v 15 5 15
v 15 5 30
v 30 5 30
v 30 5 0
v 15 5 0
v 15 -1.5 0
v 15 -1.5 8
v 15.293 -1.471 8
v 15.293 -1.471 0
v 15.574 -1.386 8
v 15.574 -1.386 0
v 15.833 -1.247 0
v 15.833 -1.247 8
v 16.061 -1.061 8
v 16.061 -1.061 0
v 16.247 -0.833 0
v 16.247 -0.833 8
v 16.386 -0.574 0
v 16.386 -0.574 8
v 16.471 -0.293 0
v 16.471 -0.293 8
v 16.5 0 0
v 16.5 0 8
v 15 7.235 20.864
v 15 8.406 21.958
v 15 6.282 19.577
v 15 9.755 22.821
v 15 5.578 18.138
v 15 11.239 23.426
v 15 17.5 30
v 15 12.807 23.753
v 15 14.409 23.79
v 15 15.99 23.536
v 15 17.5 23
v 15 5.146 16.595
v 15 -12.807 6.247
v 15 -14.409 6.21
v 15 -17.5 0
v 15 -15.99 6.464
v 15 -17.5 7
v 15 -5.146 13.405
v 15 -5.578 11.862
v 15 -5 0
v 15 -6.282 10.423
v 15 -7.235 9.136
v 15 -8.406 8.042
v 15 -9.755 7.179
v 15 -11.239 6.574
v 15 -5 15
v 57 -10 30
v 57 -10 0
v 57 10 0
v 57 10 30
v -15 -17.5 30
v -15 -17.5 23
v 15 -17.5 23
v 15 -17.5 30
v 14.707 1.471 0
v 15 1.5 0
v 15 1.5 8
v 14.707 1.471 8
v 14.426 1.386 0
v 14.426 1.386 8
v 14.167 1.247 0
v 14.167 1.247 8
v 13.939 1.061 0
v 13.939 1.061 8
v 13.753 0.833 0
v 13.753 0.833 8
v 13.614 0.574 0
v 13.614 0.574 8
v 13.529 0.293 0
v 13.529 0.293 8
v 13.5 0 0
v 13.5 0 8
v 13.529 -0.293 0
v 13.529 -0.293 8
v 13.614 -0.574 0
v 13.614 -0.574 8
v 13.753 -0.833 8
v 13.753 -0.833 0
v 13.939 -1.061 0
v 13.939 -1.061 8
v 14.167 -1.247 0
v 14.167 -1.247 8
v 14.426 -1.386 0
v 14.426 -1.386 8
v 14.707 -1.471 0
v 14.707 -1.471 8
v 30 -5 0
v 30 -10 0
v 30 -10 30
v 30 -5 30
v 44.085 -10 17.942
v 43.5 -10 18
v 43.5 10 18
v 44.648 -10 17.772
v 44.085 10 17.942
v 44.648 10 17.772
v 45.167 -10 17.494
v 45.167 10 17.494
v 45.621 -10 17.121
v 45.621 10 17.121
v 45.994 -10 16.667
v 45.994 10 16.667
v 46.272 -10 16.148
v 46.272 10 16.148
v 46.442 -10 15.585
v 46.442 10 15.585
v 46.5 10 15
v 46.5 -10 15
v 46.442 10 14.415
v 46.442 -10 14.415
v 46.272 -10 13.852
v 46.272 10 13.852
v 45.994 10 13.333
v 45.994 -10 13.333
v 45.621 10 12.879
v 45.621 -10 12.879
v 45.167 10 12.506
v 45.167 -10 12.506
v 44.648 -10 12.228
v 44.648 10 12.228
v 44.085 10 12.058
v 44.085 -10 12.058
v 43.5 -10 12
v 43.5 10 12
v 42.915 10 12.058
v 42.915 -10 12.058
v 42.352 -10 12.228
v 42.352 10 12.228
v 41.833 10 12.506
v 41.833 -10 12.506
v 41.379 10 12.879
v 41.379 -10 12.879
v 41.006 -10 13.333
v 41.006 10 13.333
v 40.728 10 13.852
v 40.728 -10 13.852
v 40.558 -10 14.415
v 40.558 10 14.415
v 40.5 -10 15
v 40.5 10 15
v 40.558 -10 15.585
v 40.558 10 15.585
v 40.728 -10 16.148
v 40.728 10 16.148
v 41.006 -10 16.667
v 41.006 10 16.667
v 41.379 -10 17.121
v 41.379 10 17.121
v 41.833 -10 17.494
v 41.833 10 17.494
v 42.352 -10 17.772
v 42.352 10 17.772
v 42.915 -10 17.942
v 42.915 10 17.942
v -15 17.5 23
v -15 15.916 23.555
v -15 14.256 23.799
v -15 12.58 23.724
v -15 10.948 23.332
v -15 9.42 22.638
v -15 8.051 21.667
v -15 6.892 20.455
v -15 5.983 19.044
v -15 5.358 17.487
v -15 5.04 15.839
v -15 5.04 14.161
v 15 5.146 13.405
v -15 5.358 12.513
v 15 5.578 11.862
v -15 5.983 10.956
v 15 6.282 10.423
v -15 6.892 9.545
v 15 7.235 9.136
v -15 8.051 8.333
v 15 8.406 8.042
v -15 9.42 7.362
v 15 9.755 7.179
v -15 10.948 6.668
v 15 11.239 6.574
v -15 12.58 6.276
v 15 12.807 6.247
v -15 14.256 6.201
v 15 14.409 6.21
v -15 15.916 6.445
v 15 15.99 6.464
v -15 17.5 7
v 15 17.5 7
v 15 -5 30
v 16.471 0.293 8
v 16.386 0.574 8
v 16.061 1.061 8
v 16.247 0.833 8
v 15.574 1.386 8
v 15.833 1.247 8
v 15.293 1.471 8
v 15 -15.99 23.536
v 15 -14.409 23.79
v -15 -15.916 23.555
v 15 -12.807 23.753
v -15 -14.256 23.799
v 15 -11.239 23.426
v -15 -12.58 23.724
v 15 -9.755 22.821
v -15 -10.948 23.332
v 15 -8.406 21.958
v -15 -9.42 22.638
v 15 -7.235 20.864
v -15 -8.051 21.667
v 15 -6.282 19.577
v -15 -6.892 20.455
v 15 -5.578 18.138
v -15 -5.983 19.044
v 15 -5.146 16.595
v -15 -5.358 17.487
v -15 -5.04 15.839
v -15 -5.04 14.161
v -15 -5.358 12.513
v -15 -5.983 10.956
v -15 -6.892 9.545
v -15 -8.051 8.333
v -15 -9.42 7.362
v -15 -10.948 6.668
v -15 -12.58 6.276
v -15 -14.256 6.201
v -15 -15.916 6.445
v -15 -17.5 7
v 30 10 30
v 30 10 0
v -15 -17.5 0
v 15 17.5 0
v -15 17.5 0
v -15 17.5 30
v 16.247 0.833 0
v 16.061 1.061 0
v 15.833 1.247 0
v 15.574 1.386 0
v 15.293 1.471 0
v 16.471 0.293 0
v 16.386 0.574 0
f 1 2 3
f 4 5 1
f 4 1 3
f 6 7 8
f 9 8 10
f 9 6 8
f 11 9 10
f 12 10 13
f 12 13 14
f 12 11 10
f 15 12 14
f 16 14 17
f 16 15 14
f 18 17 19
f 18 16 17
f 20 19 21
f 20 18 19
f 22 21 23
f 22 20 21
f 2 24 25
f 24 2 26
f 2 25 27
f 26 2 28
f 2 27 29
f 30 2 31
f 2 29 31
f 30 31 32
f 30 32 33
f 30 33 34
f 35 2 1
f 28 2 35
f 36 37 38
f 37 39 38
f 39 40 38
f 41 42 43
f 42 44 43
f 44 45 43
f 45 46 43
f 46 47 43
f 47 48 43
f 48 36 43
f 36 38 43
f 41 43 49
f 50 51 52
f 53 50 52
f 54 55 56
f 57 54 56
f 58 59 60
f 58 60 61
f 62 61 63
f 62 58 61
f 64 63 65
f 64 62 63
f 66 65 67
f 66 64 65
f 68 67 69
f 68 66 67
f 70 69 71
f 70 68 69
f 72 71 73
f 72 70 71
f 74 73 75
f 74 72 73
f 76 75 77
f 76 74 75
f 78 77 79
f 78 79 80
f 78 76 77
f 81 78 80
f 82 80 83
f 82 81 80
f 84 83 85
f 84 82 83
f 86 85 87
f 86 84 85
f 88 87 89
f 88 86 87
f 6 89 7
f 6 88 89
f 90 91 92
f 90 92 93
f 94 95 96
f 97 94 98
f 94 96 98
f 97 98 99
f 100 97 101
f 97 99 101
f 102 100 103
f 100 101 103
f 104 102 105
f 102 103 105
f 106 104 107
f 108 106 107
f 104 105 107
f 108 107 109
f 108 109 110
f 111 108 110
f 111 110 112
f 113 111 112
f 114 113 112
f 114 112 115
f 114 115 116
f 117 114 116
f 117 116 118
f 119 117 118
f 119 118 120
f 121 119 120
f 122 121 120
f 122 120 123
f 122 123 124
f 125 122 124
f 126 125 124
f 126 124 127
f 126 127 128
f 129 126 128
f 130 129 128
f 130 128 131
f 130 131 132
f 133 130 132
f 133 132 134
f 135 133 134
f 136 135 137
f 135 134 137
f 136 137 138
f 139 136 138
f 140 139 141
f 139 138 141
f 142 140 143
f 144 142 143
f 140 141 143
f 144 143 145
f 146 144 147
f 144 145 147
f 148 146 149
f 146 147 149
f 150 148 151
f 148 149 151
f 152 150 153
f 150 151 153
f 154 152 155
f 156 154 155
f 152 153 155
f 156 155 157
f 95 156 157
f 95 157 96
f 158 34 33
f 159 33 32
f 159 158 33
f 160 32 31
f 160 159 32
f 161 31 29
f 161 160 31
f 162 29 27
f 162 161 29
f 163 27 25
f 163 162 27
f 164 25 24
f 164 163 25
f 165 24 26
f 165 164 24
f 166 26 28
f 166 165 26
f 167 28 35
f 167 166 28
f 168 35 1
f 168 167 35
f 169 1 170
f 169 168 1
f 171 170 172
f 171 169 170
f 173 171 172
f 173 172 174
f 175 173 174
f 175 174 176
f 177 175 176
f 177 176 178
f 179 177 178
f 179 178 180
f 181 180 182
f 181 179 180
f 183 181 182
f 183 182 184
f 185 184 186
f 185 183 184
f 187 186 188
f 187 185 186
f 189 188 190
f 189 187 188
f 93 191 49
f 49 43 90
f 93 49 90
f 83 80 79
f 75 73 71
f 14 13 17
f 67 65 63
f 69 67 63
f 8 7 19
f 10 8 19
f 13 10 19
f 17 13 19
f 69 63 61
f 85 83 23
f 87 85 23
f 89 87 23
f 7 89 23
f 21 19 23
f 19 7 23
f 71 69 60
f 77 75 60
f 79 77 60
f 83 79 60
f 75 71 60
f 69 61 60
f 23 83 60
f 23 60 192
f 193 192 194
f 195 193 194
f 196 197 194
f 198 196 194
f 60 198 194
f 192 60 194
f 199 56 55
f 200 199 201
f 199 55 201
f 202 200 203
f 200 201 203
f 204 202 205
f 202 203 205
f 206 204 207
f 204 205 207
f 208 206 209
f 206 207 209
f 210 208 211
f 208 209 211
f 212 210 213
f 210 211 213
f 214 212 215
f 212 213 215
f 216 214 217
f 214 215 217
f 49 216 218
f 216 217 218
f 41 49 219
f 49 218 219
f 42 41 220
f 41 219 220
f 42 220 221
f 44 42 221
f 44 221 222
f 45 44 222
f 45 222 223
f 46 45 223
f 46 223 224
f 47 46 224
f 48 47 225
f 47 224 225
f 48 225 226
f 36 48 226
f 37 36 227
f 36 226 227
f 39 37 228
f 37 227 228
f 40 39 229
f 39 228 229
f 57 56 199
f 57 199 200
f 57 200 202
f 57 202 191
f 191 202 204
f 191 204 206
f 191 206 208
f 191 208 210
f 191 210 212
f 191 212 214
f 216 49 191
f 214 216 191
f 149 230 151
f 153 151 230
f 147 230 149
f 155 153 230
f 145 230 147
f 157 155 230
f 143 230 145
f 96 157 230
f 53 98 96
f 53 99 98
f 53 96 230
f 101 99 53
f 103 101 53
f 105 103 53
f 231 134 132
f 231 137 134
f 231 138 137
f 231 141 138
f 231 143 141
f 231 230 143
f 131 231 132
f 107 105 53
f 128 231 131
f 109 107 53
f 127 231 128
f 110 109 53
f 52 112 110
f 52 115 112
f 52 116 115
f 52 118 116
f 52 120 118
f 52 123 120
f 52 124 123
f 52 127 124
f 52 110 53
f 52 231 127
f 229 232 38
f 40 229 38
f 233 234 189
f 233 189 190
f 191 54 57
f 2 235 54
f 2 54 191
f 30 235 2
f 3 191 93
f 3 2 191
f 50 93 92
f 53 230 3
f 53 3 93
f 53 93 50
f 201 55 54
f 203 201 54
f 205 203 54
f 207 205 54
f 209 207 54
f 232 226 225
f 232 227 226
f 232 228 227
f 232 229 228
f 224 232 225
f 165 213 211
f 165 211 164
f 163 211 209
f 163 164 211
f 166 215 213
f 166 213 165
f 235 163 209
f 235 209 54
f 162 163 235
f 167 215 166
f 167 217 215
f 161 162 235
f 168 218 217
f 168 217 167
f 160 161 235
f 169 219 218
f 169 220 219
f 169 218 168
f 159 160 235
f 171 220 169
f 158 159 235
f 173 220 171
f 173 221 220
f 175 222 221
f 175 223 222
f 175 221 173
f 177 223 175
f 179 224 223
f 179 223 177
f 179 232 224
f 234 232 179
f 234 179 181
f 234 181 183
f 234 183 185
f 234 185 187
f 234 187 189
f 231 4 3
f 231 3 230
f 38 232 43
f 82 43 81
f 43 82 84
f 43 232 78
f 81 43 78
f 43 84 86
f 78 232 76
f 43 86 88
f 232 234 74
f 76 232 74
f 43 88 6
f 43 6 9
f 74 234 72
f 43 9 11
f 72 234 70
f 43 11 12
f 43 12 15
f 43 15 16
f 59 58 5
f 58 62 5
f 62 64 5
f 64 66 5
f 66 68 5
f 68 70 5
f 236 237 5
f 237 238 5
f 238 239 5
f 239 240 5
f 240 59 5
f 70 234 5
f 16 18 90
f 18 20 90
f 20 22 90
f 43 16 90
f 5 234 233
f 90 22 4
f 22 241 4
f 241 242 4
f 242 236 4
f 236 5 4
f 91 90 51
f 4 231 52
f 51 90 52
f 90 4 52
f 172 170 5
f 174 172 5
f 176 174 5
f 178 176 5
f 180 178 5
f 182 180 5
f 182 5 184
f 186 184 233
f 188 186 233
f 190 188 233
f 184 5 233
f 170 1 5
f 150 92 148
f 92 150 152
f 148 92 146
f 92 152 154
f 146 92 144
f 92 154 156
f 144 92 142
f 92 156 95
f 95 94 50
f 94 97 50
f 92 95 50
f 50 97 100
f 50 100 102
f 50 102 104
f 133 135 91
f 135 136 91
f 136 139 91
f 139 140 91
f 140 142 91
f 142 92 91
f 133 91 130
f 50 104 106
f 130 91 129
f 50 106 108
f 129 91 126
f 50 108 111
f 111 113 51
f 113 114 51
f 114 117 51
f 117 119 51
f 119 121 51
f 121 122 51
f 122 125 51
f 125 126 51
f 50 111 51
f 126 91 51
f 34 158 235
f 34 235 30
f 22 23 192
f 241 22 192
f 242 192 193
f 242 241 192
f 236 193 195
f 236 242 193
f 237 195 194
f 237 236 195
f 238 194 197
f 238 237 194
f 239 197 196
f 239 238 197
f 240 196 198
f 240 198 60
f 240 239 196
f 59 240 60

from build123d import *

# Parameters (mm, degrees)
SKETCH1_W           = 30
SKETCH1_H           = 35
SKETCH1_W_2         = 27
SKETCH1_H_2         = 20
SKETCH1_W_3         = 15
SKETCH1_H_3         = 10
BOSS_EXTRUDE1_DEPTH = 30
CUT_EXTRUDE1_DEPTH  = 8
SKETCH15_R          = 3
CUT_EXTRUDE3_DEPTH  = 71.037489961
CUT_EXTRUDE6_DEPTH  = 30


with BuildPart() as part:
    # Sketch1 → Boss-Extrude1 (new body)
    with BuildSketch(Plane.XY):
        Rectangle(SKETCH1_W, SKETCH1_H)
        with Locations((43.5, 0)):
            Rectangle(SKETCH1_W_2, SKETCH1_H_2)
        with Locations((22.5, 0)):
            Rectangle(SKETCH1_W_3, SKETCH1_H_3)
    extrude(amount=BOSS_EXTRUDE1_DEPTH)

    # Sketch1<3> → Cut-Extrude1 (cut)
    with BuildSketch(Plane.XY):
        with BuildLine():
            ThreePointArc((15, 1.5), (13.5, 0), (15, -1.5))
            Line((15, -1.5), (15, 1.5))
        make_face()
        with BuildLine():
            Line((15, 1.5), (15, -1.5))
            ThreePointArc((15, -1.5), (16.060660172, -1.060660172), (16.5, 0))
            ThreePointArc((16.5, 0), (16.060660172, 1.060660172), (15, 1.5))
        make_face()
    extrude(amount=CUT_EXTRUDE1_DEPTH, mode=Mode.SUBTRACT)

    # Sketch15 → Cut-Extrude3 (cut, through all)
    with BuildSketch(Plane(origin=(0, 10, 0), x_dir=(1, 0, 0), z_dir=(0, 1, 0))):
        with Locations(Location((43.5, -15, 0), (0, 0, 270))):
            Circle(SKETCH15_R)
    extrude(amount=-CUT_EXTRUDE3_DEPTH, mode=Mode.SUBTRACT)

    # Sketch5 → Cut-Extrude6 (cut)
    with BuildSketch(Plane.ZY.offset(15)):
        with BuildLine():
            Line((7, -17.5), (23, -17.5))
            ThreePointArc((23, -17.5), (15, -5), (7, -17.5))
        make_face()
        with BuildLine():
            Line((7, 17.5), (23, 17.5))
            ThreePointArc((23, 17.5), (15, 5), (7, 17.5))
        make_face()
    extrude(amount=-CUT_EXTRUDE6_DEPTH, mode=Mode.SUBTRACT)


solid = part.part
